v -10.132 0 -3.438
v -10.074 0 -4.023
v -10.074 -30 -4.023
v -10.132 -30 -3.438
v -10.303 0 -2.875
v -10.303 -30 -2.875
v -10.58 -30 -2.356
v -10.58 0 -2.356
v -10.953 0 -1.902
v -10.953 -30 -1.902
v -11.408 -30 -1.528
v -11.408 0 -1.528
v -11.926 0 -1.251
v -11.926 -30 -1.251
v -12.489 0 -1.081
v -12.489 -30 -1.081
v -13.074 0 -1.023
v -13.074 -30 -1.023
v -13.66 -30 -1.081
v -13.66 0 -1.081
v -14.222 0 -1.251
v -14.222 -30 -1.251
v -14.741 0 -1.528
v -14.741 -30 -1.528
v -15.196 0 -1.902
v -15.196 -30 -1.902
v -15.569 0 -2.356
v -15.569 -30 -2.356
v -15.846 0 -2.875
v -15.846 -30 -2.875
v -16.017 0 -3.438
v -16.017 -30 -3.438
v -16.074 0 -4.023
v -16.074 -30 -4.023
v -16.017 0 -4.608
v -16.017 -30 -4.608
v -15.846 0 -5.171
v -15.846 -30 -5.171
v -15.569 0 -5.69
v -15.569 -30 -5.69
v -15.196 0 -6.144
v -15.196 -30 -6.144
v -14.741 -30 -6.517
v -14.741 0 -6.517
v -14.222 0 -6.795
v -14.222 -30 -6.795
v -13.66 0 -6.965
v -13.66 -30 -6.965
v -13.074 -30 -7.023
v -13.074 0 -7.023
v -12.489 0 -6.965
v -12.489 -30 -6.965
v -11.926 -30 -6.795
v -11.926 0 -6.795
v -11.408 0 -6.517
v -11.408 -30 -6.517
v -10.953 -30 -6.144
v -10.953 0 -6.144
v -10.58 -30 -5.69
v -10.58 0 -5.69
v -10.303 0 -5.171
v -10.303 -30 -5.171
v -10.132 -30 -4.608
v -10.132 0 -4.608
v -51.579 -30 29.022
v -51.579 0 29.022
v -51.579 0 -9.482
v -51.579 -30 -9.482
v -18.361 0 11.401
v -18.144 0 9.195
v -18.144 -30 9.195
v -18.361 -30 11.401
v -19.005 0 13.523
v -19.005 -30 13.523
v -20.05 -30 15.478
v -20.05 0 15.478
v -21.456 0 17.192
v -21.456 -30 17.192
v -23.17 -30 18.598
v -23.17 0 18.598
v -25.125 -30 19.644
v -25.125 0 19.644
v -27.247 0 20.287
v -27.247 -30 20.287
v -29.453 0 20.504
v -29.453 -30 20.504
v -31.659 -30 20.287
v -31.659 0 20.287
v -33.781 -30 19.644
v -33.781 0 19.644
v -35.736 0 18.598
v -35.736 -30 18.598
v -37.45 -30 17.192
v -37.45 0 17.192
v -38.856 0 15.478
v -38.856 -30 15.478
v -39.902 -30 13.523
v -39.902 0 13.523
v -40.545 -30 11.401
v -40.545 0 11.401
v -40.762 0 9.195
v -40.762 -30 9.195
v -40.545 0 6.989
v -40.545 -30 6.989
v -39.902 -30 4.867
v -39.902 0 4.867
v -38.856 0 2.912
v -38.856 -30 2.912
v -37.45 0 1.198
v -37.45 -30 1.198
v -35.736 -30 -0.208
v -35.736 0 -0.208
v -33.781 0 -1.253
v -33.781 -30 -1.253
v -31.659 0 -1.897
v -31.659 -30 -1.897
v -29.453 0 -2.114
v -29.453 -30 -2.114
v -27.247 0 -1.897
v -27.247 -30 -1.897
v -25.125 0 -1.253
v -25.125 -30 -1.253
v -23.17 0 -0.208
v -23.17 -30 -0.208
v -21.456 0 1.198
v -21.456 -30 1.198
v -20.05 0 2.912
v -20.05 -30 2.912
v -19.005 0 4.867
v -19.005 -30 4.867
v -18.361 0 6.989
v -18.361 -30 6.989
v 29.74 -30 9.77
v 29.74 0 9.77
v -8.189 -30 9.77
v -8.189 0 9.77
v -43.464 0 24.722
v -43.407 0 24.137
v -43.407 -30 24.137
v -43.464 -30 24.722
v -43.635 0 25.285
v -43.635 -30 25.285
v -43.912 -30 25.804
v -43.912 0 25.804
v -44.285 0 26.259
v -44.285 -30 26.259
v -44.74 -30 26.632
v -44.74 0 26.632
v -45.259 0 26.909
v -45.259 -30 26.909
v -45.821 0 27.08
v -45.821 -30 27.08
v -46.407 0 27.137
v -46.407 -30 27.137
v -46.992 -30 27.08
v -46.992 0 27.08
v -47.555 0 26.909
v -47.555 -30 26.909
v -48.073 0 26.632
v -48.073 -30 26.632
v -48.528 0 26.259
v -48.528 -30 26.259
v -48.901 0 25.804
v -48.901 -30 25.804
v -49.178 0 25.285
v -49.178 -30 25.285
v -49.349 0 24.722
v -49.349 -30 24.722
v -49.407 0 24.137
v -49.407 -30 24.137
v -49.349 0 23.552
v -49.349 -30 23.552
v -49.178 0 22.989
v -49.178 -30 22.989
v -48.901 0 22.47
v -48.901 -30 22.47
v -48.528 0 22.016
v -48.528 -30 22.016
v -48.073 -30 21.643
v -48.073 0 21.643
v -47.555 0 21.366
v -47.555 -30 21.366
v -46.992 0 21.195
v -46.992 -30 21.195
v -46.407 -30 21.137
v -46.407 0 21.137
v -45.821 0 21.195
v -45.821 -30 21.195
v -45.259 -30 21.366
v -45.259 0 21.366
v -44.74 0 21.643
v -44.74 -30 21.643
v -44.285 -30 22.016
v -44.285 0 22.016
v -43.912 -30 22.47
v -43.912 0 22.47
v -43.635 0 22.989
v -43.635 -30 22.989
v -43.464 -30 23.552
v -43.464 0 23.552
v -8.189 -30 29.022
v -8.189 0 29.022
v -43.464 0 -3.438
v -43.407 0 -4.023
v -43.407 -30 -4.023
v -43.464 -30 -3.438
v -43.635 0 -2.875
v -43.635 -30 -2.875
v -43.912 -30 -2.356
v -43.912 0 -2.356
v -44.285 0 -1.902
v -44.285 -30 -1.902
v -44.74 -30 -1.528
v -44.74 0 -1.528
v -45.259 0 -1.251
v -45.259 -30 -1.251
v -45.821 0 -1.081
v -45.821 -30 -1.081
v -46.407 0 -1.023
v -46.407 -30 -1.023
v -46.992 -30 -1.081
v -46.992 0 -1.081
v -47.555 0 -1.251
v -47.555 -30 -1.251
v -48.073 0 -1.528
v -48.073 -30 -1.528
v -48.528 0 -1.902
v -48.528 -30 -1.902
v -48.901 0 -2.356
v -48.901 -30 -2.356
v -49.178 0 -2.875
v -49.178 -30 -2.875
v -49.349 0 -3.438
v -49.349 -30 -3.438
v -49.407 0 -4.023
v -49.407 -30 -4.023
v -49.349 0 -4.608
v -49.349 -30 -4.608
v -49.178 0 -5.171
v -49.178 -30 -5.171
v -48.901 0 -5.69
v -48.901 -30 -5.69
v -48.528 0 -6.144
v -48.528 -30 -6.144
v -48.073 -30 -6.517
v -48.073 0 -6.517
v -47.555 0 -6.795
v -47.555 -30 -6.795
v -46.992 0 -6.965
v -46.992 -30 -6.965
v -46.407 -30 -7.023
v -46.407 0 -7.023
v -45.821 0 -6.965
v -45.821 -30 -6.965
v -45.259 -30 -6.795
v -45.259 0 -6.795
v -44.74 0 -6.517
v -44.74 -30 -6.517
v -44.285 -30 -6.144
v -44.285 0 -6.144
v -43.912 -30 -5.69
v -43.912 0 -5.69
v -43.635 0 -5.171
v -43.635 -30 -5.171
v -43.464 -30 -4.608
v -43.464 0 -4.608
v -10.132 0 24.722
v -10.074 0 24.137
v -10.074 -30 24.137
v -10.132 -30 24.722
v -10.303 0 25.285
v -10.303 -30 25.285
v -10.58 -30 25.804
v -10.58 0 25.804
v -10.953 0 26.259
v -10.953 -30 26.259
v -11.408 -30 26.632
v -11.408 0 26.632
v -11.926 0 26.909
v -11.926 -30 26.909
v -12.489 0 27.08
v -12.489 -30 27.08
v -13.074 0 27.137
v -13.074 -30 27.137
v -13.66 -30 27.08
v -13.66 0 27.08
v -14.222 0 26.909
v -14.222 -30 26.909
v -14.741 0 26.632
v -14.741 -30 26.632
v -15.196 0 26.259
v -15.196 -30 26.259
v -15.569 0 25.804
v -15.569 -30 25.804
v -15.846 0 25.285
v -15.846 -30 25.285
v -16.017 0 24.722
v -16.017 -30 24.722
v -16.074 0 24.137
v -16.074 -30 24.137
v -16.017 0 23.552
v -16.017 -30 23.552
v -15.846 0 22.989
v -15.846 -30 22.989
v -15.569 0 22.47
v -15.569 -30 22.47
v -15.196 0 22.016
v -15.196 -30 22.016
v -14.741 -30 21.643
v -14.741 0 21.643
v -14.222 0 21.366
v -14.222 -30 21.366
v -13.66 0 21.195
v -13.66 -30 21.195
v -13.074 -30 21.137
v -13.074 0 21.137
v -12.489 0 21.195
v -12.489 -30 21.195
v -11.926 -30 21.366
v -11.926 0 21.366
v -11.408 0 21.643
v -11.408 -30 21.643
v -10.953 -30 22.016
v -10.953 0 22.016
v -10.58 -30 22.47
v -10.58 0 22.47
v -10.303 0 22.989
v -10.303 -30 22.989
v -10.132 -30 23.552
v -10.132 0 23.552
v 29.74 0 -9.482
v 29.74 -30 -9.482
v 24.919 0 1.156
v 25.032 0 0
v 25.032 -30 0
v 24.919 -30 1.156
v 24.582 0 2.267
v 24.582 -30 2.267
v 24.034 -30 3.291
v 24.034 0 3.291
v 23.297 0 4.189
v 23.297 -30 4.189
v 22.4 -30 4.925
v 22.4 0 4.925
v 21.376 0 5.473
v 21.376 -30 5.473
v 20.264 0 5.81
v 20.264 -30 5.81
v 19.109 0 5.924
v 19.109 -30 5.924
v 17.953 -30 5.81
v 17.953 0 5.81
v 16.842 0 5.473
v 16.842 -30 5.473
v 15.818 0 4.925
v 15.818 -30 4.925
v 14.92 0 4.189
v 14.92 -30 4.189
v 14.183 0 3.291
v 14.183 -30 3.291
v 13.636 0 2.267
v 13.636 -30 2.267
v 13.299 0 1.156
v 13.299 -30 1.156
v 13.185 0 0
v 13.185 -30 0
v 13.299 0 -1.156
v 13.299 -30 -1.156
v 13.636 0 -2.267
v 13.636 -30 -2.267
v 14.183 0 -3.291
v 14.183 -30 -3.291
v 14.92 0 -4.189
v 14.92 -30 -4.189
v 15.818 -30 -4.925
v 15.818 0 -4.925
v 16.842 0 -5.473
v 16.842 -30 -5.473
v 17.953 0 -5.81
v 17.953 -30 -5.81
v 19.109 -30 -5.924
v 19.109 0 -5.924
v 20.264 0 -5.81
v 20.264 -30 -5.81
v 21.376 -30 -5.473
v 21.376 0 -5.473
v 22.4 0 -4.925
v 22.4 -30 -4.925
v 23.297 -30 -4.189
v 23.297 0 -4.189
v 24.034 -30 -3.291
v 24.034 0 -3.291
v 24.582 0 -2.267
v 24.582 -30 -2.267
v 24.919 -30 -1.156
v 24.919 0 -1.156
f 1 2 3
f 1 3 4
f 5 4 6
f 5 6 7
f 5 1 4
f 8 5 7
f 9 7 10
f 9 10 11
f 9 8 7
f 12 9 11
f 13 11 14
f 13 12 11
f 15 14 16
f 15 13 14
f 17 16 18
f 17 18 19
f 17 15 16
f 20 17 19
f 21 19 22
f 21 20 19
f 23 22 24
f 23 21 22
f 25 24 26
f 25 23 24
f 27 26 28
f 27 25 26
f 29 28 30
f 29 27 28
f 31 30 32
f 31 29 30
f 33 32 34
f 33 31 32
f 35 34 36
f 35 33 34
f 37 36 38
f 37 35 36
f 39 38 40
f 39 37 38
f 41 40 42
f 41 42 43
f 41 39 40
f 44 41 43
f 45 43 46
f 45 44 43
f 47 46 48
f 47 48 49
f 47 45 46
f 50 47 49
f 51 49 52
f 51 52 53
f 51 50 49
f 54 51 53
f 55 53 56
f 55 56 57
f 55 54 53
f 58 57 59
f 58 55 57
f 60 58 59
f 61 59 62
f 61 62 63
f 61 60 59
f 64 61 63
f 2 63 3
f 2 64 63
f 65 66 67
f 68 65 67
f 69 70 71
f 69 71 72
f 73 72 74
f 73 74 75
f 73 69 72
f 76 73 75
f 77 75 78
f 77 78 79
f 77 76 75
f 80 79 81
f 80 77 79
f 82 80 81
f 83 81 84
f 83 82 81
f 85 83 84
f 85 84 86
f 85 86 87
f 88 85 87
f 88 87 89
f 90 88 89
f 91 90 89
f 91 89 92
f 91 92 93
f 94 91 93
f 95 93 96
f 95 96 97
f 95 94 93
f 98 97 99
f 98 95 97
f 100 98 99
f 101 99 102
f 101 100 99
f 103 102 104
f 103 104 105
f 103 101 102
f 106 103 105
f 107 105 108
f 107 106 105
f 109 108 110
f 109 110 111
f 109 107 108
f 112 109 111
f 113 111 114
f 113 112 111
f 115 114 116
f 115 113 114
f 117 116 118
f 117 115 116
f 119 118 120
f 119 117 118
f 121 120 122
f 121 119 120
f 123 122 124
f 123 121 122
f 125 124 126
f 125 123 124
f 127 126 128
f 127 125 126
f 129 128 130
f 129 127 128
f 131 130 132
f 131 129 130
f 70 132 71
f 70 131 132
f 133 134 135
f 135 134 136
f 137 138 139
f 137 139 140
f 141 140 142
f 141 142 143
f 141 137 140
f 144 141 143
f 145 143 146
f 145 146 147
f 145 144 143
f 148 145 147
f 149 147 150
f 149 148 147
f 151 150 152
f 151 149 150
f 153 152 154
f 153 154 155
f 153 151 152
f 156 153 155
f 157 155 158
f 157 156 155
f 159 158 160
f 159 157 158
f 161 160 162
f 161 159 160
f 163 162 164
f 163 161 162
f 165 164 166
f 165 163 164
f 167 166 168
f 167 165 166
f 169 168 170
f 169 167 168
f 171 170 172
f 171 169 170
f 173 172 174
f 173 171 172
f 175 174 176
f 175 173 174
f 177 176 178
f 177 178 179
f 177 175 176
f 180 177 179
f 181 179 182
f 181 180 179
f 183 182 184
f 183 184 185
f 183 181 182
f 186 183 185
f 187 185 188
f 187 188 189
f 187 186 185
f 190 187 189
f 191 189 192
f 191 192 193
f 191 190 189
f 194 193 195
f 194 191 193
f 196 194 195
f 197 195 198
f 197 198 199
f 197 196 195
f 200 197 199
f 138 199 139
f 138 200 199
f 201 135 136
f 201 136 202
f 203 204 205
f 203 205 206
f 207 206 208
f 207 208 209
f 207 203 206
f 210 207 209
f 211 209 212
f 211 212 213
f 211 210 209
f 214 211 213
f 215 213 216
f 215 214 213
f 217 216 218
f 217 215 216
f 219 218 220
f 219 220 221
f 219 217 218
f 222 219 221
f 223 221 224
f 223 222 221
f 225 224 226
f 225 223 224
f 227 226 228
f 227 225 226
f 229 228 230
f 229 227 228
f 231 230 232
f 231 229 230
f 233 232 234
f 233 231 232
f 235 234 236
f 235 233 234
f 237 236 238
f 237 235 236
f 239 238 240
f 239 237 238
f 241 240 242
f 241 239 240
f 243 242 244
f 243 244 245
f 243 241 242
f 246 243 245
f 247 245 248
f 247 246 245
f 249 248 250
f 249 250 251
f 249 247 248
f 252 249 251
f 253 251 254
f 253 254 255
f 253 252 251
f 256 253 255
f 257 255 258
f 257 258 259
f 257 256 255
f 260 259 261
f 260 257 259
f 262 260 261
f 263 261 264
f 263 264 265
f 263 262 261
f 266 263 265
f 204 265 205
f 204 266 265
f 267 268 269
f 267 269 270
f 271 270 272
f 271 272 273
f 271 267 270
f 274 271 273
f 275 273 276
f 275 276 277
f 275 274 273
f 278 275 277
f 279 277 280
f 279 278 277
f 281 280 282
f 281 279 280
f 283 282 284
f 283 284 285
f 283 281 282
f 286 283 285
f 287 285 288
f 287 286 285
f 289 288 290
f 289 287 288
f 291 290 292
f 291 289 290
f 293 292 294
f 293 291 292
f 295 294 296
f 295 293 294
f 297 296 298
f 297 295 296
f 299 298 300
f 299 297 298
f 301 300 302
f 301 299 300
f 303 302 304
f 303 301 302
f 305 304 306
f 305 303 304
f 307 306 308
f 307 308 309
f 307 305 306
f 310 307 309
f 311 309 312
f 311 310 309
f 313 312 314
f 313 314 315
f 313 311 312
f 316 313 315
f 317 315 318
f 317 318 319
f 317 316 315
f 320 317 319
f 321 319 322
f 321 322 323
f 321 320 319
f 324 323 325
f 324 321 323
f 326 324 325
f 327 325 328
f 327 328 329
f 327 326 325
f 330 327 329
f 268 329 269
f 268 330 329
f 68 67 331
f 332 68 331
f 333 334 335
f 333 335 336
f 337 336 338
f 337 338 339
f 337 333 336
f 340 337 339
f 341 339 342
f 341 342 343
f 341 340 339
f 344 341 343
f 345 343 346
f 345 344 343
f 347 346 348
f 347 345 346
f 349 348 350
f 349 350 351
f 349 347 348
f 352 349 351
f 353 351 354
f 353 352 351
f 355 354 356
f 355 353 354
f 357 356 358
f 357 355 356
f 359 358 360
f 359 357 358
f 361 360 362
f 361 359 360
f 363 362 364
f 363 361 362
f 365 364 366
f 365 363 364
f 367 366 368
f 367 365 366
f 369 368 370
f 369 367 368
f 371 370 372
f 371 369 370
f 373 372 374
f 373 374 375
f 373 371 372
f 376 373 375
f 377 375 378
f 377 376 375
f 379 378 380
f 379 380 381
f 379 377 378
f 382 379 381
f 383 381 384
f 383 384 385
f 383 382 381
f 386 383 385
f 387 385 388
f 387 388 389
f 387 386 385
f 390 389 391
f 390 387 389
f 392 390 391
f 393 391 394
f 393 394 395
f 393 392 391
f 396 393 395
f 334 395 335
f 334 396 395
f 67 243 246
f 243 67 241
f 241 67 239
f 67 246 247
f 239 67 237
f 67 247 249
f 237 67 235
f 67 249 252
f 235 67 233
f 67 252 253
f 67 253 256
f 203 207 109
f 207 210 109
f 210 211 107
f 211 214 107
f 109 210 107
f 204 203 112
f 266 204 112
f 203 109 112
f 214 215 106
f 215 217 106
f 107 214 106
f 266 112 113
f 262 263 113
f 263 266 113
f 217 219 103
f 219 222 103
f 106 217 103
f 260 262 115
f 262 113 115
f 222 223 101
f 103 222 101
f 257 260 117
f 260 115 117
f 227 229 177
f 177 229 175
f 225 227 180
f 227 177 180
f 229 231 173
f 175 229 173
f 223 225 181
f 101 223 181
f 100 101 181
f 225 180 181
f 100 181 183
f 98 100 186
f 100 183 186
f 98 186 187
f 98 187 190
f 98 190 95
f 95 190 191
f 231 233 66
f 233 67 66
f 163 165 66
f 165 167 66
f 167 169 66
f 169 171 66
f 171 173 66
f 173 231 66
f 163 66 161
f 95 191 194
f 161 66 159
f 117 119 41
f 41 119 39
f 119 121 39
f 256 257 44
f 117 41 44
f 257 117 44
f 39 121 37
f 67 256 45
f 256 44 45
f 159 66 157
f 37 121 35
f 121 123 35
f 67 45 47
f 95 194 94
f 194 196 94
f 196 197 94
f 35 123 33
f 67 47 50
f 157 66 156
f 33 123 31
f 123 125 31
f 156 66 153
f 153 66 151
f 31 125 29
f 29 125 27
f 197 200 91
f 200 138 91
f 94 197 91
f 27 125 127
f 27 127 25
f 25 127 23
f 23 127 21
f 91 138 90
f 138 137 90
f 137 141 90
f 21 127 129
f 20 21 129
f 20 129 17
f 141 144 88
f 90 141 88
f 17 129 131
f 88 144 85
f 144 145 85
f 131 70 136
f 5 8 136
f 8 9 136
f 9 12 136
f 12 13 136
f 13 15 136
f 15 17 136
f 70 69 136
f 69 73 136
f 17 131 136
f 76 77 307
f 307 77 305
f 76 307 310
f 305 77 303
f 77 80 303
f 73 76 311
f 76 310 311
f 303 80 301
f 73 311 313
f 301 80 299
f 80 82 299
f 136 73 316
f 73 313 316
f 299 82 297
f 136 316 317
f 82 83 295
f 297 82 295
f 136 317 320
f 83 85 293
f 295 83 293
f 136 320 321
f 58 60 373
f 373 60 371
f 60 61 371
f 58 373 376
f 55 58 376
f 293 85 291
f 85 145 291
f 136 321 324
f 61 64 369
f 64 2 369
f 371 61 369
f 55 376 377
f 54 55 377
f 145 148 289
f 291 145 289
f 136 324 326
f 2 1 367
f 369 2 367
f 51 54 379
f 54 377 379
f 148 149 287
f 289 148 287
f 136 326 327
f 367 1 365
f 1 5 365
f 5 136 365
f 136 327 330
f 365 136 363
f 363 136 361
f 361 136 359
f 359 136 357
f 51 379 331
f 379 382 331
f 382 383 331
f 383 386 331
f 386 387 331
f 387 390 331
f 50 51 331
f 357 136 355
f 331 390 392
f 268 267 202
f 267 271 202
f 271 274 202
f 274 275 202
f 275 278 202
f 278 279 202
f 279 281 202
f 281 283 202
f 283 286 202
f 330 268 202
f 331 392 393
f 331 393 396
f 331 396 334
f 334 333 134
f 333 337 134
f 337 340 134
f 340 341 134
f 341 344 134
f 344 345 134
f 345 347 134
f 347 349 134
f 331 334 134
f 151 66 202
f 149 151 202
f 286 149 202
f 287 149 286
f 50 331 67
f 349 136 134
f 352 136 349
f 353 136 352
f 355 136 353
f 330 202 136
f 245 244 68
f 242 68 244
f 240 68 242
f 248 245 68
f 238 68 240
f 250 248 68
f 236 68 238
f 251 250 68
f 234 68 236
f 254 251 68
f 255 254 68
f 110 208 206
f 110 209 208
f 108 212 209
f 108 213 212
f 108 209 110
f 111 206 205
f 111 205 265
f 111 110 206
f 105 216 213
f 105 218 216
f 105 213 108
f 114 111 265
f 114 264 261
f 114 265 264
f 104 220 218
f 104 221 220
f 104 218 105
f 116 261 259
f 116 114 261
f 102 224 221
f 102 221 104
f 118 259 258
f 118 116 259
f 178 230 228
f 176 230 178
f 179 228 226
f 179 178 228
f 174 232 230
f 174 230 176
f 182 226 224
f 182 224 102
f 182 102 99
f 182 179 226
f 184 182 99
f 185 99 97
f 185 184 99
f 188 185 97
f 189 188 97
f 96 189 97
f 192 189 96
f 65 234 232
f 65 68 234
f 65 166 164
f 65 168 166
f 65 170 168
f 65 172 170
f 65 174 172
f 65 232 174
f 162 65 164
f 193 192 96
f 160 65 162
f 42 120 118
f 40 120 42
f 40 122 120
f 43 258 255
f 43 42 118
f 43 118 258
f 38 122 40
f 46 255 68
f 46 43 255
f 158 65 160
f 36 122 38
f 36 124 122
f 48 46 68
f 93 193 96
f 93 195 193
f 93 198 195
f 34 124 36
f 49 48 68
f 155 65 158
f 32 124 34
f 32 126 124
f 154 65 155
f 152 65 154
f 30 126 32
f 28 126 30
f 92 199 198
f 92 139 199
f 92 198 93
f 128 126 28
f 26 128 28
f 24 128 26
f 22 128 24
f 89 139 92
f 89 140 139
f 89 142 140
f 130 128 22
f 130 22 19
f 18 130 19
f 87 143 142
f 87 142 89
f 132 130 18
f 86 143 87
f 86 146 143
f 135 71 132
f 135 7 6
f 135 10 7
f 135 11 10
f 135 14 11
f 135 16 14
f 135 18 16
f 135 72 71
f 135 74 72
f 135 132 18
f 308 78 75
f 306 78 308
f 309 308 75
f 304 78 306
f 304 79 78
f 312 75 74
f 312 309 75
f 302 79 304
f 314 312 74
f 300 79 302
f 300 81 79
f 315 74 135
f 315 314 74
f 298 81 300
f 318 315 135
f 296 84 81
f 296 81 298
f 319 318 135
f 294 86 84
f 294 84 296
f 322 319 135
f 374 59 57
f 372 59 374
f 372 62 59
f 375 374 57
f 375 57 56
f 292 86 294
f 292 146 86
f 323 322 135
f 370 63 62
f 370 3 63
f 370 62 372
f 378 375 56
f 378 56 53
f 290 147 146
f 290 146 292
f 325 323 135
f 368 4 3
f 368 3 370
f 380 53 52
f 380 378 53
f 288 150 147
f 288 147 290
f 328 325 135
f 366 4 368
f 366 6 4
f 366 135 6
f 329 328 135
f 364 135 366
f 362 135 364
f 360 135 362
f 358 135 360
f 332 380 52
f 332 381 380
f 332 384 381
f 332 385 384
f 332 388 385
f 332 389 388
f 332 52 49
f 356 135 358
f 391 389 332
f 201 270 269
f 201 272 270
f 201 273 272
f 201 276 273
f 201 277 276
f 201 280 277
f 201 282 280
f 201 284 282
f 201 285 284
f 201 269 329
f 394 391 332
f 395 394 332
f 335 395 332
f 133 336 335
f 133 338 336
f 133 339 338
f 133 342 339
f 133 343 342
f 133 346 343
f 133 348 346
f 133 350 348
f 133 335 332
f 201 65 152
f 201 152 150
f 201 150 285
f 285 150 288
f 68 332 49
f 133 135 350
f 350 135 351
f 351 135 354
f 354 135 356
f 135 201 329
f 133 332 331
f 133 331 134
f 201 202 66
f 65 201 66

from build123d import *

# Parameters (mm, degrees)
F0_R     = 3
F0_R_2   = 11.309241
F0_R_3   = 5.923824
F1_DEPTH = 30


with BuildPart() as f1:
    # F0 (on Front) → F1 (new body)
    with BuildSketch(Plane.XZ):
        Polygon((-8.18941, 29.022118), (-51.57891, 29.022118), (-51.57891, -9.482474), (-8.18941, -9.482474), (29.740484, -9.482474), (29.740484, 9.769822), (-8.18941, 9.769822), align=None)
        with Locations((-46.406654, -4.022868)):
            Circle(F0_R, mode=Mode.SUBTRACT)
        with Locations((-13.074319, -4.022868)):
            Circle(F0_R, mode=Mode.SUBTRACT)
        with Locations((-29.453138, 9.195126)):
            Circle(F0_R_2, mode=Mode.SUBTRACT)
        with Locations((19.108622, 0)):
            Circle(F0_R_3, mode=Mode.SUBTRACT)
        with Locations((-46.406654, 24.137207)):
            Circle(F0_R, mode=Mode.SUBTRACT)
        with Locations((-13.074319, 24.137207)):
            Circle(F0_R, mode=Mode.SUBTRACT)
    extrude(amount=F1_DEPTH)


solid = f1.part
